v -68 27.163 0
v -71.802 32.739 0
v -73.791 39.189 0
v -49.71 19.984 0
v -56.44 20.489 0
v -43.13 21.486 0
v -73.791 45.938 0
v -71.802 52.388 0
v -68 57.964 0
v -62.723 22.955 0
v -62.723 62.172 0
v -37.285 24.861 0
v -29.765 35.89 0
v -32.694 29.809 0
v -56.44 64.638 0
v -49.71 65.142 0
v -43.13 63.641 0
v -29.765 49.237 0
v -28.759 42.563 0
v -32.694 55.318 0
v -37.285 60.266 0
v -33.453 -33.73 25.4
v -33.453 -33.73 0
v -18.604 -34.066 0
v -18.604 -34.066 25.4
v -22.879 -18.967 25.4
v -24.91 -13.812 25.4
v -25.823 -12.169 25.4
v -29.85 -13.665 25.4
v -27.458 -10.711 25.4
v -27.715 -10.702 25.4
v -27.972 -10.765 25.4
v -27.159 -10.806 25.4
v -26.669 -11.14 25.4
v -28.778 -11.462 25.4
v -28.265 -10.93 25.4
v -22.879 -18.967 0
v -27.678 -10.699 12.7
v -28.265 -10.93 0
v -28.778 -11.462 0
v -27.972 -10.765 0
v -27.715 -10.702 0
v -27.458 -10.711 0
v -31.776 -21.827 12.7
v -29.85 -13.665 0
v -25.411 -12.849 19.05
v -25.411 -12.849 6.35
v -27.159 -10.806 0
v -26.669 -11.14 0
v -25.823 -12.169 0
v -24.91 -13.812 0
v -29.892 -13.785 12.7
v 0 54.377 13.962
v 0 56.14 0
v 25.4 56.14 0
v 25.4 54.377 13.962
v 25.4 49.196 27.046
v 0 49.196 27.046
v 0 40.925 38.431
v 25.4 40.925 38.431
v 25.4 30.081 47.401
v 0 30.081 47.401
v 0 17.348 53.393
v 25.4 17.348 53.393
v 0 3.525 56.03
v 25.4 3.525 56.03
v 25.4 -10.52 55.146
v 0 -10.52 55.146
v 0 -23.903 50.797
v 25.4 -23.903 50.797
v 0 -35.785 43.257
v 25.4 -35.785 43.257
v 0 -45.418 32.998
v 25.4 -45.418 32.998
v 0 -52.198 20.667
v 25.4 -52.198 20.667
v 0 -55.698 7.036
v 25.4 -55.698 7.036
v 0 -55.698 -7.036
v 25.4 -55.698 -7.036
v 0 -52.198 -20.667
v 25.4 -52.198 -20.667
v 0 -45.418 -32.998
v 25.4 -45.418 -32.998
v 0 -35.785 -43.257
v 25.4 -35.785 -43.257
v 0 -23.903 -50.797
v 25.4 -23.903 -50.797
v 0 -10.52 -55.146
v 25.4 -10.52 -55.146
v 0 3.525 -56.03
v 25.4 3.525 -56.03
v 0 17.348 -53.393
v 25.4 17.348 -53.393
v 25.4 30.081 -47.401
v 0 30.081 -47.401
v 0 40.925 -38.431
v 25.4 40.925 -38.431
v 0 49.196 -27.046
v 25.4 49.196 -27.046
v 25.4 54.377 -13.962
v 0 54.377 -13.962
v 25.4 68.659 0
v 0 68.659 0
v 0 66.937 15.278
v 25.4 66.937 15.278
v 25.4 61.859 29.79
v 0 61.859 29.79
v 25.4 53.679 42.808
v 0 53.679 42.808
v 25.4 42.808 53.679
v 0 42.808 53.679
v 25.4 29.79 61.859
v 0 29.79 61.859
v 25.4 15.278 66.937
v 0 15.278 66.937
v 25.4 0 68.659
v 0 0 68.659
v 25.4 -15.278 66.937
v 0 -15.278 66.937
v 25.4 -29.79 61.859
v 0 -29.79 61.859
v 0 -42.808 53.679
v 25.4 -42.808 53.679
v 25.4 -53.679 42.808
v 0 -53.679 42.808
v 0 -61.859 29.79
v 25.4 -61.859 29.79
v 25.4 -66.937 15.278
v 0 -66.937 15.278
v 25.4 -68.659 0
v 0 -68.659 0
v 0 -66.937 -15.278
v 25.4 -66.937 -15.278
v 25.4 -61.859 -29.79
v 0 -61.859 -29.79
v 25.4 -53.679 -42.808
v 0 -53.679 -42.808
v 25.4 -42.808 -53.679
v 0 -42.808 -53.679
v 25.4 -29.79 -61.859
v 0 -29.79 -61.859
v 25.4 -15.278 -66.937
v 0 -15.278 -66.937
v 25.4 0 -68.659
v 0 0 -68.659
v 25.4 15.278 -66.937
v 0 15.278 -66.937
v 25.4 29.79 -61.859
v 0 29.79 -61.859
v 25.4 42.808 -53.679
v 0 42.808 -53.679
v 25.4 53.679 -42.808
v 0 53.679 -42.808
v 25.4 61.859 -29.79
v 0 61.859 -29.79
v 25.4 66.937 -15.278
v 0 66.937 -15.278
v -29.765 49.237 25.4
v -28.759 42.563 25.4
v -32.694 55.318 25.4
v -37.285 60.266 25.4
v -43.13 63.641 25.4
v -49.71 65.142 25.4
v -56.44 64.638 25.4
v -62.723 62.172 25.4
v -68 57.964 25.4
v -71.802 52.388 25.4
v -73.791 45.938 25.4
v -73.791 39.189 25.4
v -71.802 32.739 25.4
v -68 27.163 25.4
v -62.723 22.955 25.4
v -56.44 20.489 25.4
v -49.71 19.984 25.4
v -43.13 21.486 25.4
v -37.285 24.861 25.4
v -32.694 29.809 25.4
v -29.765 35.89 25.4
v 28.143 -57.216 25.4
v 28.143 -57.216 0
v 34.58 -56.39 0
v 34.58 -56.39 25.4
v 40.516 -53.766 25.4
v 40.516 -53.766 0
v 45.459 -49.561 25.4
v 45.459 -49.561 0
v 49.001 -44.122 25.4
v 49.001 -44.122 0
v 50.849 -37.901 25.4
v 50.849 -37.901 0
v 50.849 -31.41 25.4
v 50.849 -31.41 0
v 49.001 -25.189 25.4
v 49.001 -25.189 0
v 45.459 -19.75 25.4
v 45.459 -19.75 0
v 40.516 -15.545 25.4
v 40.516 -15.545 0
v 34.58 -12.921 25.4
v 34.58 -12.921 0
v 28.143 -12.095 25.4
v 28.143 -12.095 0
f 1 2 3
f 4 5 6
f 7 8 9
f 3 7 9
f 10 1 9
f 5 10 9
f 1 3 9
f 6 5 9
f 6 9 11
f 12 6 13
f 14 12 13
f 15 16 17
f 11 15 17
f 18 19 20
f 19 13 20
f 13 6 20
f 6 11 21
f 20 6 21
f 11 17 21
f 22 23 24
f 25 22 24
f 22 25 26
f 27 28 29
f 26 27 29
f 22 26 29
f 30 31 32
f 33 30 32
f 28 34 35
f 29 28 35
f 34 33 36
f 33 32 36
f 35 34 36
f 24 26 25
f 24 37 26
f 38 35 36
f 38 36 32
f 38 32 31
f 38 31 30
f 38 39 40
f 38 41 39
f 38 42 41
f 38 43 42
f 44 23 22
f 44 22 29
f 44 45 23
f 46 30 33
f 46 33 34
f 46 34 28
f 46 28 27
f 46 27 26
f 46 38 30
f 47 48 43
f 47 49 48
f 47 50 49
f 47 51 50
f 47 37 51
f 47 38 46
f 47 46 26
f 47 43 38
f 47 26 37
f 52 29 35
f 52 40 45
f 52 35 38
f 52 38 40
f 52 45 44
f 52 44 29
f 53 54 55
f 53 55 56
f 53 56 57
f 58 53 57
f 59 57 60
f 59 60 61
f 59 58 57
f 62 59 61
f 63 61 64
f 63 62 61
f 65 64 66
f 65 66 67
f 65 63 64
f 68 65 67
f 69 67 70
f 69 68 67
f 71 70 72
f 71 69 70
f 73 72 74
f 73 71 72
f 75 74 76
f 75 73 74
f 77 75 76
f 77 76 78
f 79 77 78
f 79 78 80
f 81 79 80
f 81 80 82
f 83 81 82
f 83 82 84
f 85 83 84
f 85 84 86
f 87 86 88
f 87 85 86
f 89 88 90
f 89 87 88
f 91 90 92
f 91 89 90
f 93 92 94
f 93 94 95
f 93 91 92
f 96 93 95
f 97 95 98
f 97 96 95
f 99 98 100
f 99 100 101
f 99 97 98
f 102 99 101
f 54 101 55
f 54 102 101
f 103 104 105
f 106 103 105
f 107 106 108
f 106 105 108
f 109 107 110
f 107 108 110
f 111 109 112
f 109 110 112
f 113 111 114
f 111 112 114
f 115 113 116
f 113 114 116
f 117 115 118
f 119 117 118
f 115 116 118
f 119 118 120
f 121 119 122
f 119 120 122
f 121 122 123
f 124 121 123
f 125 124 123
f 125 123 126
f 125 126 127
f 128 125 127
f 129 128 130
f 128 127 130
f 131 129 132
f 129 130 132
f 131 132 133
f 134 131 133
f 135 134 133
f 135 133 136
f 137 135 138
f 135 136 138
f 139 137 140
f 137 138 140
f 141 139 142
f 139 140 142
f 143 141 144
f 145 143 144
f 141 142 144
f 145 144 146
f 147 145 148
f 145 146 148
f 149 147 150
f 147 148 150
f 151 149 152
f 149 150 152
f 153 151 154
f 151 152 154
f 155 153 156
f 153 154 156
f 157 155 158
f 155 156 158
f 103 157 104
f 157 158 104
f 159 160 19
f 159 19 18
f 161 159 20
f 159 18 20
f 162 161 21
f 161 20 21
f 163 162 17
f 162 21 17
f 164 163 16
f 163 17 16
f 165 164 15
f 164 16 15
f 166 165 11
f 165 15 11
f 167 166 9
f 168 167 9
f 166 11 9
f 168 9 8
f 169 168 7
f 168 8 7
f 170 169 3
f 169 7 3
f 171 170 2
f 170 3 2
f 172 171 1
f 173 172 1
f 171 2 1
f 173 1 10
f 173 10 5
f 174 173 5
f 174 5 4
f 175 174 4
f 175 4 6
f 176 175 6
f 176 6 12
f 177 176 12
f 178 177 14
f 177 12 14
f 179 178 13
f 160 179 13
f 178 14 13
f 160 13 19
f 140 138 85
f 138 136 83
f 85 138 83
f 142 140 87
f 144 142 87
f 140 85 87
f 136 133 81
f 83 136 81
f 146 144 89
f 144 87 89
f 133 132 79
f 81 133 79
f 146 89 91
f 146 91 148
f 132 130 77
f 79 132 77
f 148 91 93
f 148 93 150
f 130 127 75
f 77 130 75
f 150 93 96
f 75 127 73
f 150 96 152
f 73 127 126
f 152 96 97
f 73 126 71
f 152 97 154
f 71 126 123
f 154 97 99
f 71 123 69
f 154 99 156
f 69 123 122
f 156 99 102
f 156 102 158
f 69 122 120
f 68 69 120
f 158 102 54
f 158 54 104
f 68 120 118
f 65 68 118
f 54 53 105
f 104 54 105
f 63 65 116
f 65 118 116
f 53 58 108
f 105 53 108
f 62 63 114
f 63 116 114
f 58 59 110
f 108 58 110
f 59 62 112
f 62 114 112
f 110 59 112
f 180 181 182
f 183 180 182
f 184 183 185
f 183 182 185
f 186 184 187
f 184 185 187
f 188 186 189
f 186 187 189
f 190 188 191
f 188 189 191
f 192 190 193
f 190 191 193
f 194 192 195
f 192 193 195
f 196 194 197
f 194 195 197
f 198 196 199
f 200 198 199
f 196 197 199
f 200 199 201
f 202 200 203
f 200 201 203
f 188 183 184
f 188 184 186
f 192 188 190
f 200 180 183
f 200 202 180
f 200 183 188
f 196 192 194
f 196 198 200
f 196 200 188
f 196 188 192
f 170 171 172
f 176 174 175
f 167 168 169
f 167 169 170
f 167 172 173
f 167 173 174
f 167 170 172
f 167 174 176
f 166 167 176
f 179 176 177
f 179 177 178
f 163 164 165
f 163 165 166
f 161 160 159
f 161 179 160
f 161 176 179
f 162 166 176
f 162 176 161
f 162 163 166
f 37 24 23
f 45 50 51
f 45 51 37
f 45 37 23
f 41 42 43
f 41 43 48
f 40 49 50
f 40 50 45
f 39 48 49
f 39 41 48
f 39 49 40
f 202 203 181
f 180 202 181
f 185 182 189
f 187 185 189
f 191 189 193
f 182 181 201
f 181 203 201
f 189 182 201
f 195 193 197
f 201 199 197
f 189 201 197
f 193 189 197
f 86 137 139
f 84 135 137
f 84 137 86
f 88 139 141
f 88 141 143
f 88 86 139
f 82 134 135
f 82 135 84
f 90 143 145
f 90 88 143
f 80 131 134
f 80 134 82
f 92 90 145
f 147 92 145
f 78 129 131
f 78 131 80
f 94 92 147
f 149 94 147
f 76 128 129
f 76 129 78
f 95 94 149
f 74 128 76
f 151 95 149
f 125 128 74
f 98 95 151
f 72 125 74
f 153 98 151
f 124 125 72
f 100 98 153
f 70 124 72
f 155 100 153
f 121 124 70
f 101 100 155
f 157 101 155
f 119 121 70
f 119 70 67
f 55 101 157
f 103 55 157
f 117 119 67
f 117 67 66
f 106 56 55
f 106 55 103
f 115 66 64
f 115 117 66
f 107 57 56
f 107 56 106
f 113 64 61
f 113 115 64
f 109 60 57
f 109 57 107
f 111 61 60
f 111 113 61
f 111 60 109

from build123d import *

# Parameters (mm, degrees)
F0_R     = 22.6423411402
F1_DEPTH = 25.4
F2_R     = 68.6585459697
F2_R_2   = 56.1403072128
F3_DEPTH = 25.4


with BuildPart() as f1:
    # F0 (on Top) → F1 (new body)
    with BuildSketch(Plane.XY):
        with Locations((-51.4017753303, 42.5634607673)):
            Circle(F0_R)
    extrude(amount=F1_DEPTH)


with BuildPart() as f1b:
    # F0 (on Top) → F1, piece 2 (new body)
    with BuildSketch(Plane.XY):
        with BuildLine():
            add(Edge.make_bspline(
                [(-33.4526954697, -33.7300439706), (-31.8902508459, -20.6226160201), (-28.2703961578, -0.8125506468), (-22.0113989405, -20.5386821895), (-18.603615844, -34.0655751986)],
                knots=[0.1711107042, 0.1711107042, 0.1711107042, 0.1711107042, 0.4930081966, 0.8238107987, 0.8238107987, 0.8238107987, 0.8238107987], degree=3))
            Line((-33.4526954697, -33.7300439706), (-18.603615844, -34.0655751986))
        make_face()
    extrude(amount=F1_DEPTH)


with BuildPart() as f1c:
    # F0 (on Top) → F1, piece 3 (new body)
    with BuildSketch(Plane.XY):
        with BuildLine():
            ThreePointArc((28.1430538744, -57.2164542973), (51.083158057, -34.6554946154), (28.1430538744, -12.0945349336))
            Line((28.1430538744, -12.0945349336), (28.1430538744, -57.2164542973))
        make_face()
    extrude(amount=F1_DEPTH)


with BuildPart() as f3:
    # F2 (on Right) → F3 (new body)
    with BuildSketch(Plane.YZ):
        Circle(F2_R)
        Circle(F2_R_2, mode=Mode.SUBTRACT)
    extrude(amount=F3_DEPTH)


solid = Compound([f1.part, f1b.part, f1c.part, f3.part])
